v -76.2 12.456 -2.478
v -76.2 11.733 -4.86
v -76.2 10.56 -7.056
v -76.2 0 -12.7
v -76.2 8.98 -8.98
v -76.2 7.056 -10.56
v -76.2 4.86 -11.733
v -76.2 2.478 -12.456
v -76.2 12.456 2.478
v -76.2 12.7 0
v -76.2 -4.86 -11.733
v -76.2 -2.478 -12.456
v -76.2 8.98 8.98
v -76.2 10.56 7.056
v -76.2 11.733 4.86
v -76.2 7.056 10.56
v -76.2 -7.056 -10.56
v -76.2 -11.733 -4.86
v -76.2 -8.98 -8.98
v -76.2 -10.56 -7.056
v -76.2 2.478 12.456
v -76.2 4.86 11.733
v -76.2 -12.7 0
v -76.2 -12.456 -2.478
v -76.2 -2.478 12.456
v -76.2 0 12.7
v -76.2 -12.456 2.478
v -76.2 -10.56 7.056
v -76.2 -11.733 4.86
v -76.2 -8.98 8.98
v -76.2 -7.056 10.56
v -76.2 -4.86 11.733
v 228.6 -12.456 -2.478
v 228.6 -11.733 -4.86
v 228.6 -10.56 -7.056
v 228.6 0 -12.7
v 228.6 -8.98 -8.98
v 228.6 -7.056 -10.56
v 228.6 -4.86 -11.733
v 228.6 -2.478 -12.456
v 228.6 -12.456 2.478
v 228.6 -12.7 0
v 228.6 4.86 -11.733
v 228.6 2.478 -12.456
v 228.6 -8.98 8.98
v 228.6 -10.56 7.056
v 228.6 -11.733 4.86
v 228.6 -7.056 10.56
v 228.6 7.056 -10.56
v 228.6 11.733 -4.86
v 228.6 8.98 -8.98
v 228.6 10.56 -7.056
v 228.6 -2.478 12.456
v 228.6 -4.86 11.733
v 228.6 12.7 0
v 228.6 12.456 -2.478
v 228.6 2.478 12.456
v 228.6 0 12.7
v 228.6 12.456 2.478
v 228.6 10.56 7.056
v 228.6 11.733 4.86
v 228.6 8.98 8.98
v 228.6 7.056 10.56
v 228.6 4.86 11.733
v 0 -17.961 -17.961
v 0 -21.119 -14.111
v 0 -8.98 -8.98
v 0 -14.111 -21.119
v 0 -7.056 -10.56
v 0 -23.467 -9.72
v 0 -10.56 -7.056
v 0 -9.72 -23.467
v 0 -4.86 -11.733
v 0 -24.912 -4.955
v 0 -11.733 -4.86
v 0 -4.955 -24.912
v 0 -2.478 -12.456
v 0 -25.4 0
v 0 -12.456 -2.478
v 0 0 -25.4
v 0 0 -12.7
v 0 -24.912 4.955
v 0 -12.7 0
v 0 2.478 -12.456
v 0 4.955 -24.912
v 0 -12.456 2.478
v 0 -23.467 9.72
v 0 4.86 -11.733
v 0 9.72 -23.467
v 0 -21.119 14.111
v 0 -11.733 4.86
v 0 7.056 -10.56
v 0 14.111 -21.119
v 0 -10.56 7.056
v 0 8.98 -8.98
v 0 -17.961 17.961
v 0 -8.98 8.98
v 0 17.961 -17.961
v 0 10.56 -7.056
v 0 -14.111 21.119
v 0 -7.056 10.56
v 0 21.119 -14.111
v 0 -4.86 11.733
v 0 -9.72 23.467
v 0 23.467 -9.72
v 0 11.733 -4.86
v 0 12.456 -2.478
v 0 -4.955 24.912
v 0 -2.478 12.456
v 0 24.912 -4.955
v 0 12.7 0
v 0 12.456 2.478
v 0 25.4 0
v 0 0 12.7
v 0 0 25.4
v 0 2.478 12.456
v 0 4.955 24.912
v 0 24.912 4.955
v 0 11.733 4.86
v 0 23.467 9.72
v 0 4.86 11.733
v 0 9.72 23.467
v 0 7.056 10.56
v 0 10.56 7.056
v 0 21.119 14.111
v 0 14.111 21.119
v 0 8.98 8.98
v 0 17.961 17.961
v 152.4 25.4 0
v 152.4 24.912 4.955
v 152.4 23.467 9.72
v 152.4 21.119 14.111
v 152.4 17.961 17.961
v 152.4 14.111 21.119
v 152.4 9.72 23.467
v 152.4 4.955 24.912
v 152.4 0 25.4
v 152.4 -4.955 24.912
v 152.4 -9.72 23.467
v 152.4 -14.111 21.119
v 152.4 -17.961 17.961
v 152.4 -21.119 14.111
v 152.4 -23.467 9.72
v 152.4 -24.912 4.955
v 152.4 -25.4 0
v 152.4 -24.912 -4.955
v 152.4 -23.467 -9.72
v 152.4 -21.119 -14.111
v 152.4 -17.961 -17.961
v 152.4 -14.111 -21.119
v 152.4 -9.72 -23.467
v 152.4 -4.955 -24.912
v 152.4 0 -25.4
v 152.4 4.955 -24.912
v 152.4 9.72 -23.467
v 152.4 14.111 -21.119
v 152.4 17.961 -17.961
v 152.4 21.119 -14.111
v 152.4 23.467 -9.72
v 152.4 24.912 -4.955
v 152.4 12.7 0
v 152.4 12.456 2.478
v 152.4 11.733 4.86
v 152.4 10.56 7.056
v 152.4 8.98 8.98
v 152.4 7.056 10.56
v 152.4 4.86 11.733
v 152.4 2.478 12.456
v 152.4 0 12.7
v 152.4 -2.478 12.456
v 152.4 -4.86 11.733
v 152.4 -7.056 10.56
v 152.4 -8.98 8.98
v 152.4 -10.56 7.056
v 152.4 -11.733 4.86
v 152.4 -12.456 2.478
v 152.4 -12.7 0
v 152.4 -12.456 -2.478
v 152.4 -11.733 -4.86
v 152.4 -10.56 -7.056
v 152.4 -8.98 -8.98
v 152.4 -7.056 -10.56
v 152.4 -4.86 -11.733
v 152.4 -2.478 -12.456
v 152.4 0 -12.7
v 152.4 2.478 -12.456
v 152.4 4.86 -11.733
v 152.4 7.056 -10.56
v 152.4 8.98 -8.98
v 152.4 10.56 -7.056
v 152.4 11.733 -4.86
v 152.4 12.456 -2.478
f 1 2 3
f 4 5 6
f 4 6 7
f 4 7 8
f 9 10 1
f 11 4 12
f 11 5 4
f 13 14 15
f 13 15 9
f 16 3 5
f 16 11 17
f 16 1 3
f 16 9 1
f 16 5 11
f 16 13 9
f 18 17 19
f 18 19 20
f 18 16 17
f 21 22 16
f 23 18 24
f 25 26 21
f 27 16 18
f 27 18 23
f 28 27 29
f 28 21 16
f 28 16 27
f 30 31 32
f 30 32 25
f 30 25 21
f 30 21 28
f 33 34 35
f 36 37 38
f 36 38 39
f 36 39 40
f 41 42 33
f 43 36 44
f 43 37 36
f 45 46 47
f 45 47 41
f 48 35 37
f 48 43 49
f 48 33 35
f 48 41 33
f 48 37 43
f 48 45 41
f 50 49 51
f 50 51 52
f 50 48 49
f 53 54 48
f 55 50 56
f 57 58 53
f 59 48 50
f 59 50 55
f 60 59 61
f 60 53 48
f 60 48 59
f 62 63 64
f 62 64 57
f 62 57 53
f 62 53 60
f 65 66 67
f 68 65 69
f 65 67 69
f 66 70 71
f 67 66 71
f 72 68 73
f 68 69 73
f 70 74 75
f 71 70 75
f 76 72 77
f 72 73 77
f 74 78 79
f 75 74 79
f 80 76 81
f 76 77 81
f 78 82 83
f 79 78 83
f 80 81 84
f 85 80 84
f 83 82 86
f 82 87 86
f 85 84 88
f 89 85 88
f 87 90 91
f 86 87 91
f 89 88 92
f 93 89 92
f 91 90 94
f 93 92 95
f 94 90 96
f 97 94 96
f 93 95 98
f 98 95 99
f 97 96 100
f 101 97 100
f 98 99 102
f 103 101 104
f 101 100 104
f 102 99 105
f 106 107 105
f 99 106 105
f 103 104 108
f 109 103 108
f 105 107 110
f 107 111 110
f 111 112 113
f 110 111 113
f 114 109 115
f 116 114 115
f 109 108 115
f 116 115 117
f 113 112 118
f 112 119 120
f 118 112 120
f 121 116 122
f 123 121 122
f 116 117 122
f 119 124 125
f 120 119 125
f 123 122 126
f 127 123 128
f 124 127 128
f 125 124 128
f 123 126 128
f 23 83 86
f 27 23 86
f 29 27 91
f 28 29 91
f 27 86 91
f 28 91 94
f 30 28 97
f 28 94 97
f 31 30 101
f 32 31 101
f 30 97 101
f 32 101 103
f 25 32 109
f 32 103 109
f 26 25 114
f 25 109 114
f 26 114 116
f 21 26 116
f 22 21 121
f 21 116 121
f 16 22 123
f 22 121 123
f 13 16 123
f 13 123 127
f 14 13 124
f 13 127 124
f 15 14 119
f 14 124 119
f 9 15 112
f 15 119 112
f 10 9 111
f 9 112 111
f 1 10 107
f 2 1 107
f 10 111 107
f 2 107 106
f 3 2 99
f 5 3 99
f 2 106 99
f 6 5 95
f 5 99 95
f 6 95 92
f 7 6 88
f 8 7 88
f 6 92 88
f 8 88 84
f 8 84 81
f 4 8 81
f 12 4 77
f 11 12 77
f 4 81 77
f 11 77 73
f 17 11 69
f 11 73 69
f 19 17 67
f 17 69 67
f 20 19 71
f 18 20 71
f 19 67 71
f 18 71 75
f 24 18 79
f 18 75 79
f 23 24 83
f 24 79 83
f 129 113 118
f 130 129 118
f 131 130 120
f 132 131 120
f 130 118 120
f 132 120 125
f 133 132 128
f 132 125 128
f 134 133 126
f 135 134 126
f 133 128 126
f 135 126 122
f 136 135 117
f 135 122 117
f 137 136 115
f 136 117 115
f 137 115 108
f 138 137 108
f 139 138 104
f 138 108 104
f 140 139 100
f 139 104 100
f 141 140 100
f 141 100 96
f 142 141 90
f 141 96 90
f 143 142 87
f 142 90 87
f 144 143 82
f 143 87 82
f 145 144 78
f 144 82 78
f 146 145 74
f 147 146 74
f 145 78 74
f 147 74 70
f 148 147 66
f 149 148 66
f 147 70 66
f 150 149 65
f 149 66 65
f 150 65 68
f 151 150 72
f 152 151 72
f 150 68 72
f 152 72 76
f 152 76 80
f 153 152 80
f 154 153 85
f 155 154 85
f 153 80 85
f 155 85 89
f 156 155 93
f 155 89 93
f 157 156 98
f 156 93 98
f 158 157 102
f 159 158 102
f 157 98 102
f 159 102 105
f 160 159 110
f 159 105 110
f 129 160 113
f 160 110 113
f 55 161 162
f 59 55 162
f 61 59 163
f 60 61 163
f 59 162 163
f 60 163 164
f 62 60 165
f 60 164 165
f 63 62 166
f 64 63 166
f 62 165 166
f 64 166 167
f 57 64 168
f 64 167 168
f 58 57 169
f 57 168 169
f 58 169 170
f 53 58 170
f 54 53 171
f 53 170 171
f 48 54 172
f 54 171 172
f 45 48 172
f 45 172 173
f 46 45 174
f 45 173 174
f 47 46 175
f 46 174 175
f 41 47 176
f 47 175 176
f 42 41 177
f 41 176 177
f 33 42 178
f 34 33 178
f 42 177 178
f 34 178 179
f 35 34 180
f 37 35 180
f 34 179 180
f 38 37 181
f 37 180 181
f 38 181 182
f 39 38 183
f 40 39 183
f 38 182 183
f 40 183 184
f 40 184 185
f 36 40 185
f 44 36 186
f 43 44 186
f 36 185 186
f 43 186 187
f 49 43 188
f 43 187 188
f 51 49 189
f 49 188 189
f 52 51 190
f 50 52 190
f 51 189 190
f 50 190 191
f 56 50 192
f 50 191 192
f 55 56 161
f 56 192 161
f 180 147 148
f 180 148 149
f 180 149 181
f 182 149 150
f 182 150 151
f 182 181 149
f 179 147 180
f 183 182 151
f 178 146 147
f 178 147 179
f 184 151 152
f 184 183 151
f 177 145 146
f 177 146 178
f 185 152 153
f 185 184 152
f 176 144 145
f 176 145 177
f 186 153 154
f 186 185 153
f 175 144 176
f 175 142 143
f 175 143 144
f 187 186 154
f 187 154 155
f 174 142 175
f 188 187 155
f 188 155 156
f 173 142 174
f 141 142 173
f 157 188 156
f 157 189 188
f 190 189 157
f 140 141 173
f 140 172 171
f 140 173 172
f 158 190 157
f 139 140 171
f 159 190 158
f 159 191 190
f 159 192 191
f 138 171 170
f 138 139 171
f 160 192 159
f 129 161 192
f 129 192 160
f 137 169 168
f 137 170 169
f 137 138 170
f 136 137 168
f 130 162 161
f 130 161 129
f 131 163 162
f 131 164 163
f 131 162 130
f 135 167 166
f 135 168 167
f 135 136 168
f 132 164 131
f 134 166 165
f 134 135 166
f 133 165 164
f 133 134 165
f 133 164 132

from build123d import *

# Parameters (mm, degrees)
F0_R     = 25.4
F1_DEPTH = 152.4
F2_R     = 12.7
F3_DEPTH = 76.2
F4_R     = 12.7
F5_DEPTH = 76.2


with BuildPart() as f1:
    # F0 (on Right) → F1 (new body)
    with BuildSketch(Plane.YZ):
        Circle(F0_R)
    extrude(amount=F1_DEPTH)

    # F2 (on face) → F3 (join)
    with BuildSketch(Plane(origin=(0, 0, 0), x_dir=(0, -1, 0), z_dir=(-1, 0, 0))):
        Circle(F2_R)
    extrude(amount=F3_DEPTH)

    # F4 (on face) → F5 (join)
    with BuildSketch(Plane.YZ.offset(152.4)):
        Circle(F4_R)
    extrude(amount=F5_DEPTH)


solid = f1.part
